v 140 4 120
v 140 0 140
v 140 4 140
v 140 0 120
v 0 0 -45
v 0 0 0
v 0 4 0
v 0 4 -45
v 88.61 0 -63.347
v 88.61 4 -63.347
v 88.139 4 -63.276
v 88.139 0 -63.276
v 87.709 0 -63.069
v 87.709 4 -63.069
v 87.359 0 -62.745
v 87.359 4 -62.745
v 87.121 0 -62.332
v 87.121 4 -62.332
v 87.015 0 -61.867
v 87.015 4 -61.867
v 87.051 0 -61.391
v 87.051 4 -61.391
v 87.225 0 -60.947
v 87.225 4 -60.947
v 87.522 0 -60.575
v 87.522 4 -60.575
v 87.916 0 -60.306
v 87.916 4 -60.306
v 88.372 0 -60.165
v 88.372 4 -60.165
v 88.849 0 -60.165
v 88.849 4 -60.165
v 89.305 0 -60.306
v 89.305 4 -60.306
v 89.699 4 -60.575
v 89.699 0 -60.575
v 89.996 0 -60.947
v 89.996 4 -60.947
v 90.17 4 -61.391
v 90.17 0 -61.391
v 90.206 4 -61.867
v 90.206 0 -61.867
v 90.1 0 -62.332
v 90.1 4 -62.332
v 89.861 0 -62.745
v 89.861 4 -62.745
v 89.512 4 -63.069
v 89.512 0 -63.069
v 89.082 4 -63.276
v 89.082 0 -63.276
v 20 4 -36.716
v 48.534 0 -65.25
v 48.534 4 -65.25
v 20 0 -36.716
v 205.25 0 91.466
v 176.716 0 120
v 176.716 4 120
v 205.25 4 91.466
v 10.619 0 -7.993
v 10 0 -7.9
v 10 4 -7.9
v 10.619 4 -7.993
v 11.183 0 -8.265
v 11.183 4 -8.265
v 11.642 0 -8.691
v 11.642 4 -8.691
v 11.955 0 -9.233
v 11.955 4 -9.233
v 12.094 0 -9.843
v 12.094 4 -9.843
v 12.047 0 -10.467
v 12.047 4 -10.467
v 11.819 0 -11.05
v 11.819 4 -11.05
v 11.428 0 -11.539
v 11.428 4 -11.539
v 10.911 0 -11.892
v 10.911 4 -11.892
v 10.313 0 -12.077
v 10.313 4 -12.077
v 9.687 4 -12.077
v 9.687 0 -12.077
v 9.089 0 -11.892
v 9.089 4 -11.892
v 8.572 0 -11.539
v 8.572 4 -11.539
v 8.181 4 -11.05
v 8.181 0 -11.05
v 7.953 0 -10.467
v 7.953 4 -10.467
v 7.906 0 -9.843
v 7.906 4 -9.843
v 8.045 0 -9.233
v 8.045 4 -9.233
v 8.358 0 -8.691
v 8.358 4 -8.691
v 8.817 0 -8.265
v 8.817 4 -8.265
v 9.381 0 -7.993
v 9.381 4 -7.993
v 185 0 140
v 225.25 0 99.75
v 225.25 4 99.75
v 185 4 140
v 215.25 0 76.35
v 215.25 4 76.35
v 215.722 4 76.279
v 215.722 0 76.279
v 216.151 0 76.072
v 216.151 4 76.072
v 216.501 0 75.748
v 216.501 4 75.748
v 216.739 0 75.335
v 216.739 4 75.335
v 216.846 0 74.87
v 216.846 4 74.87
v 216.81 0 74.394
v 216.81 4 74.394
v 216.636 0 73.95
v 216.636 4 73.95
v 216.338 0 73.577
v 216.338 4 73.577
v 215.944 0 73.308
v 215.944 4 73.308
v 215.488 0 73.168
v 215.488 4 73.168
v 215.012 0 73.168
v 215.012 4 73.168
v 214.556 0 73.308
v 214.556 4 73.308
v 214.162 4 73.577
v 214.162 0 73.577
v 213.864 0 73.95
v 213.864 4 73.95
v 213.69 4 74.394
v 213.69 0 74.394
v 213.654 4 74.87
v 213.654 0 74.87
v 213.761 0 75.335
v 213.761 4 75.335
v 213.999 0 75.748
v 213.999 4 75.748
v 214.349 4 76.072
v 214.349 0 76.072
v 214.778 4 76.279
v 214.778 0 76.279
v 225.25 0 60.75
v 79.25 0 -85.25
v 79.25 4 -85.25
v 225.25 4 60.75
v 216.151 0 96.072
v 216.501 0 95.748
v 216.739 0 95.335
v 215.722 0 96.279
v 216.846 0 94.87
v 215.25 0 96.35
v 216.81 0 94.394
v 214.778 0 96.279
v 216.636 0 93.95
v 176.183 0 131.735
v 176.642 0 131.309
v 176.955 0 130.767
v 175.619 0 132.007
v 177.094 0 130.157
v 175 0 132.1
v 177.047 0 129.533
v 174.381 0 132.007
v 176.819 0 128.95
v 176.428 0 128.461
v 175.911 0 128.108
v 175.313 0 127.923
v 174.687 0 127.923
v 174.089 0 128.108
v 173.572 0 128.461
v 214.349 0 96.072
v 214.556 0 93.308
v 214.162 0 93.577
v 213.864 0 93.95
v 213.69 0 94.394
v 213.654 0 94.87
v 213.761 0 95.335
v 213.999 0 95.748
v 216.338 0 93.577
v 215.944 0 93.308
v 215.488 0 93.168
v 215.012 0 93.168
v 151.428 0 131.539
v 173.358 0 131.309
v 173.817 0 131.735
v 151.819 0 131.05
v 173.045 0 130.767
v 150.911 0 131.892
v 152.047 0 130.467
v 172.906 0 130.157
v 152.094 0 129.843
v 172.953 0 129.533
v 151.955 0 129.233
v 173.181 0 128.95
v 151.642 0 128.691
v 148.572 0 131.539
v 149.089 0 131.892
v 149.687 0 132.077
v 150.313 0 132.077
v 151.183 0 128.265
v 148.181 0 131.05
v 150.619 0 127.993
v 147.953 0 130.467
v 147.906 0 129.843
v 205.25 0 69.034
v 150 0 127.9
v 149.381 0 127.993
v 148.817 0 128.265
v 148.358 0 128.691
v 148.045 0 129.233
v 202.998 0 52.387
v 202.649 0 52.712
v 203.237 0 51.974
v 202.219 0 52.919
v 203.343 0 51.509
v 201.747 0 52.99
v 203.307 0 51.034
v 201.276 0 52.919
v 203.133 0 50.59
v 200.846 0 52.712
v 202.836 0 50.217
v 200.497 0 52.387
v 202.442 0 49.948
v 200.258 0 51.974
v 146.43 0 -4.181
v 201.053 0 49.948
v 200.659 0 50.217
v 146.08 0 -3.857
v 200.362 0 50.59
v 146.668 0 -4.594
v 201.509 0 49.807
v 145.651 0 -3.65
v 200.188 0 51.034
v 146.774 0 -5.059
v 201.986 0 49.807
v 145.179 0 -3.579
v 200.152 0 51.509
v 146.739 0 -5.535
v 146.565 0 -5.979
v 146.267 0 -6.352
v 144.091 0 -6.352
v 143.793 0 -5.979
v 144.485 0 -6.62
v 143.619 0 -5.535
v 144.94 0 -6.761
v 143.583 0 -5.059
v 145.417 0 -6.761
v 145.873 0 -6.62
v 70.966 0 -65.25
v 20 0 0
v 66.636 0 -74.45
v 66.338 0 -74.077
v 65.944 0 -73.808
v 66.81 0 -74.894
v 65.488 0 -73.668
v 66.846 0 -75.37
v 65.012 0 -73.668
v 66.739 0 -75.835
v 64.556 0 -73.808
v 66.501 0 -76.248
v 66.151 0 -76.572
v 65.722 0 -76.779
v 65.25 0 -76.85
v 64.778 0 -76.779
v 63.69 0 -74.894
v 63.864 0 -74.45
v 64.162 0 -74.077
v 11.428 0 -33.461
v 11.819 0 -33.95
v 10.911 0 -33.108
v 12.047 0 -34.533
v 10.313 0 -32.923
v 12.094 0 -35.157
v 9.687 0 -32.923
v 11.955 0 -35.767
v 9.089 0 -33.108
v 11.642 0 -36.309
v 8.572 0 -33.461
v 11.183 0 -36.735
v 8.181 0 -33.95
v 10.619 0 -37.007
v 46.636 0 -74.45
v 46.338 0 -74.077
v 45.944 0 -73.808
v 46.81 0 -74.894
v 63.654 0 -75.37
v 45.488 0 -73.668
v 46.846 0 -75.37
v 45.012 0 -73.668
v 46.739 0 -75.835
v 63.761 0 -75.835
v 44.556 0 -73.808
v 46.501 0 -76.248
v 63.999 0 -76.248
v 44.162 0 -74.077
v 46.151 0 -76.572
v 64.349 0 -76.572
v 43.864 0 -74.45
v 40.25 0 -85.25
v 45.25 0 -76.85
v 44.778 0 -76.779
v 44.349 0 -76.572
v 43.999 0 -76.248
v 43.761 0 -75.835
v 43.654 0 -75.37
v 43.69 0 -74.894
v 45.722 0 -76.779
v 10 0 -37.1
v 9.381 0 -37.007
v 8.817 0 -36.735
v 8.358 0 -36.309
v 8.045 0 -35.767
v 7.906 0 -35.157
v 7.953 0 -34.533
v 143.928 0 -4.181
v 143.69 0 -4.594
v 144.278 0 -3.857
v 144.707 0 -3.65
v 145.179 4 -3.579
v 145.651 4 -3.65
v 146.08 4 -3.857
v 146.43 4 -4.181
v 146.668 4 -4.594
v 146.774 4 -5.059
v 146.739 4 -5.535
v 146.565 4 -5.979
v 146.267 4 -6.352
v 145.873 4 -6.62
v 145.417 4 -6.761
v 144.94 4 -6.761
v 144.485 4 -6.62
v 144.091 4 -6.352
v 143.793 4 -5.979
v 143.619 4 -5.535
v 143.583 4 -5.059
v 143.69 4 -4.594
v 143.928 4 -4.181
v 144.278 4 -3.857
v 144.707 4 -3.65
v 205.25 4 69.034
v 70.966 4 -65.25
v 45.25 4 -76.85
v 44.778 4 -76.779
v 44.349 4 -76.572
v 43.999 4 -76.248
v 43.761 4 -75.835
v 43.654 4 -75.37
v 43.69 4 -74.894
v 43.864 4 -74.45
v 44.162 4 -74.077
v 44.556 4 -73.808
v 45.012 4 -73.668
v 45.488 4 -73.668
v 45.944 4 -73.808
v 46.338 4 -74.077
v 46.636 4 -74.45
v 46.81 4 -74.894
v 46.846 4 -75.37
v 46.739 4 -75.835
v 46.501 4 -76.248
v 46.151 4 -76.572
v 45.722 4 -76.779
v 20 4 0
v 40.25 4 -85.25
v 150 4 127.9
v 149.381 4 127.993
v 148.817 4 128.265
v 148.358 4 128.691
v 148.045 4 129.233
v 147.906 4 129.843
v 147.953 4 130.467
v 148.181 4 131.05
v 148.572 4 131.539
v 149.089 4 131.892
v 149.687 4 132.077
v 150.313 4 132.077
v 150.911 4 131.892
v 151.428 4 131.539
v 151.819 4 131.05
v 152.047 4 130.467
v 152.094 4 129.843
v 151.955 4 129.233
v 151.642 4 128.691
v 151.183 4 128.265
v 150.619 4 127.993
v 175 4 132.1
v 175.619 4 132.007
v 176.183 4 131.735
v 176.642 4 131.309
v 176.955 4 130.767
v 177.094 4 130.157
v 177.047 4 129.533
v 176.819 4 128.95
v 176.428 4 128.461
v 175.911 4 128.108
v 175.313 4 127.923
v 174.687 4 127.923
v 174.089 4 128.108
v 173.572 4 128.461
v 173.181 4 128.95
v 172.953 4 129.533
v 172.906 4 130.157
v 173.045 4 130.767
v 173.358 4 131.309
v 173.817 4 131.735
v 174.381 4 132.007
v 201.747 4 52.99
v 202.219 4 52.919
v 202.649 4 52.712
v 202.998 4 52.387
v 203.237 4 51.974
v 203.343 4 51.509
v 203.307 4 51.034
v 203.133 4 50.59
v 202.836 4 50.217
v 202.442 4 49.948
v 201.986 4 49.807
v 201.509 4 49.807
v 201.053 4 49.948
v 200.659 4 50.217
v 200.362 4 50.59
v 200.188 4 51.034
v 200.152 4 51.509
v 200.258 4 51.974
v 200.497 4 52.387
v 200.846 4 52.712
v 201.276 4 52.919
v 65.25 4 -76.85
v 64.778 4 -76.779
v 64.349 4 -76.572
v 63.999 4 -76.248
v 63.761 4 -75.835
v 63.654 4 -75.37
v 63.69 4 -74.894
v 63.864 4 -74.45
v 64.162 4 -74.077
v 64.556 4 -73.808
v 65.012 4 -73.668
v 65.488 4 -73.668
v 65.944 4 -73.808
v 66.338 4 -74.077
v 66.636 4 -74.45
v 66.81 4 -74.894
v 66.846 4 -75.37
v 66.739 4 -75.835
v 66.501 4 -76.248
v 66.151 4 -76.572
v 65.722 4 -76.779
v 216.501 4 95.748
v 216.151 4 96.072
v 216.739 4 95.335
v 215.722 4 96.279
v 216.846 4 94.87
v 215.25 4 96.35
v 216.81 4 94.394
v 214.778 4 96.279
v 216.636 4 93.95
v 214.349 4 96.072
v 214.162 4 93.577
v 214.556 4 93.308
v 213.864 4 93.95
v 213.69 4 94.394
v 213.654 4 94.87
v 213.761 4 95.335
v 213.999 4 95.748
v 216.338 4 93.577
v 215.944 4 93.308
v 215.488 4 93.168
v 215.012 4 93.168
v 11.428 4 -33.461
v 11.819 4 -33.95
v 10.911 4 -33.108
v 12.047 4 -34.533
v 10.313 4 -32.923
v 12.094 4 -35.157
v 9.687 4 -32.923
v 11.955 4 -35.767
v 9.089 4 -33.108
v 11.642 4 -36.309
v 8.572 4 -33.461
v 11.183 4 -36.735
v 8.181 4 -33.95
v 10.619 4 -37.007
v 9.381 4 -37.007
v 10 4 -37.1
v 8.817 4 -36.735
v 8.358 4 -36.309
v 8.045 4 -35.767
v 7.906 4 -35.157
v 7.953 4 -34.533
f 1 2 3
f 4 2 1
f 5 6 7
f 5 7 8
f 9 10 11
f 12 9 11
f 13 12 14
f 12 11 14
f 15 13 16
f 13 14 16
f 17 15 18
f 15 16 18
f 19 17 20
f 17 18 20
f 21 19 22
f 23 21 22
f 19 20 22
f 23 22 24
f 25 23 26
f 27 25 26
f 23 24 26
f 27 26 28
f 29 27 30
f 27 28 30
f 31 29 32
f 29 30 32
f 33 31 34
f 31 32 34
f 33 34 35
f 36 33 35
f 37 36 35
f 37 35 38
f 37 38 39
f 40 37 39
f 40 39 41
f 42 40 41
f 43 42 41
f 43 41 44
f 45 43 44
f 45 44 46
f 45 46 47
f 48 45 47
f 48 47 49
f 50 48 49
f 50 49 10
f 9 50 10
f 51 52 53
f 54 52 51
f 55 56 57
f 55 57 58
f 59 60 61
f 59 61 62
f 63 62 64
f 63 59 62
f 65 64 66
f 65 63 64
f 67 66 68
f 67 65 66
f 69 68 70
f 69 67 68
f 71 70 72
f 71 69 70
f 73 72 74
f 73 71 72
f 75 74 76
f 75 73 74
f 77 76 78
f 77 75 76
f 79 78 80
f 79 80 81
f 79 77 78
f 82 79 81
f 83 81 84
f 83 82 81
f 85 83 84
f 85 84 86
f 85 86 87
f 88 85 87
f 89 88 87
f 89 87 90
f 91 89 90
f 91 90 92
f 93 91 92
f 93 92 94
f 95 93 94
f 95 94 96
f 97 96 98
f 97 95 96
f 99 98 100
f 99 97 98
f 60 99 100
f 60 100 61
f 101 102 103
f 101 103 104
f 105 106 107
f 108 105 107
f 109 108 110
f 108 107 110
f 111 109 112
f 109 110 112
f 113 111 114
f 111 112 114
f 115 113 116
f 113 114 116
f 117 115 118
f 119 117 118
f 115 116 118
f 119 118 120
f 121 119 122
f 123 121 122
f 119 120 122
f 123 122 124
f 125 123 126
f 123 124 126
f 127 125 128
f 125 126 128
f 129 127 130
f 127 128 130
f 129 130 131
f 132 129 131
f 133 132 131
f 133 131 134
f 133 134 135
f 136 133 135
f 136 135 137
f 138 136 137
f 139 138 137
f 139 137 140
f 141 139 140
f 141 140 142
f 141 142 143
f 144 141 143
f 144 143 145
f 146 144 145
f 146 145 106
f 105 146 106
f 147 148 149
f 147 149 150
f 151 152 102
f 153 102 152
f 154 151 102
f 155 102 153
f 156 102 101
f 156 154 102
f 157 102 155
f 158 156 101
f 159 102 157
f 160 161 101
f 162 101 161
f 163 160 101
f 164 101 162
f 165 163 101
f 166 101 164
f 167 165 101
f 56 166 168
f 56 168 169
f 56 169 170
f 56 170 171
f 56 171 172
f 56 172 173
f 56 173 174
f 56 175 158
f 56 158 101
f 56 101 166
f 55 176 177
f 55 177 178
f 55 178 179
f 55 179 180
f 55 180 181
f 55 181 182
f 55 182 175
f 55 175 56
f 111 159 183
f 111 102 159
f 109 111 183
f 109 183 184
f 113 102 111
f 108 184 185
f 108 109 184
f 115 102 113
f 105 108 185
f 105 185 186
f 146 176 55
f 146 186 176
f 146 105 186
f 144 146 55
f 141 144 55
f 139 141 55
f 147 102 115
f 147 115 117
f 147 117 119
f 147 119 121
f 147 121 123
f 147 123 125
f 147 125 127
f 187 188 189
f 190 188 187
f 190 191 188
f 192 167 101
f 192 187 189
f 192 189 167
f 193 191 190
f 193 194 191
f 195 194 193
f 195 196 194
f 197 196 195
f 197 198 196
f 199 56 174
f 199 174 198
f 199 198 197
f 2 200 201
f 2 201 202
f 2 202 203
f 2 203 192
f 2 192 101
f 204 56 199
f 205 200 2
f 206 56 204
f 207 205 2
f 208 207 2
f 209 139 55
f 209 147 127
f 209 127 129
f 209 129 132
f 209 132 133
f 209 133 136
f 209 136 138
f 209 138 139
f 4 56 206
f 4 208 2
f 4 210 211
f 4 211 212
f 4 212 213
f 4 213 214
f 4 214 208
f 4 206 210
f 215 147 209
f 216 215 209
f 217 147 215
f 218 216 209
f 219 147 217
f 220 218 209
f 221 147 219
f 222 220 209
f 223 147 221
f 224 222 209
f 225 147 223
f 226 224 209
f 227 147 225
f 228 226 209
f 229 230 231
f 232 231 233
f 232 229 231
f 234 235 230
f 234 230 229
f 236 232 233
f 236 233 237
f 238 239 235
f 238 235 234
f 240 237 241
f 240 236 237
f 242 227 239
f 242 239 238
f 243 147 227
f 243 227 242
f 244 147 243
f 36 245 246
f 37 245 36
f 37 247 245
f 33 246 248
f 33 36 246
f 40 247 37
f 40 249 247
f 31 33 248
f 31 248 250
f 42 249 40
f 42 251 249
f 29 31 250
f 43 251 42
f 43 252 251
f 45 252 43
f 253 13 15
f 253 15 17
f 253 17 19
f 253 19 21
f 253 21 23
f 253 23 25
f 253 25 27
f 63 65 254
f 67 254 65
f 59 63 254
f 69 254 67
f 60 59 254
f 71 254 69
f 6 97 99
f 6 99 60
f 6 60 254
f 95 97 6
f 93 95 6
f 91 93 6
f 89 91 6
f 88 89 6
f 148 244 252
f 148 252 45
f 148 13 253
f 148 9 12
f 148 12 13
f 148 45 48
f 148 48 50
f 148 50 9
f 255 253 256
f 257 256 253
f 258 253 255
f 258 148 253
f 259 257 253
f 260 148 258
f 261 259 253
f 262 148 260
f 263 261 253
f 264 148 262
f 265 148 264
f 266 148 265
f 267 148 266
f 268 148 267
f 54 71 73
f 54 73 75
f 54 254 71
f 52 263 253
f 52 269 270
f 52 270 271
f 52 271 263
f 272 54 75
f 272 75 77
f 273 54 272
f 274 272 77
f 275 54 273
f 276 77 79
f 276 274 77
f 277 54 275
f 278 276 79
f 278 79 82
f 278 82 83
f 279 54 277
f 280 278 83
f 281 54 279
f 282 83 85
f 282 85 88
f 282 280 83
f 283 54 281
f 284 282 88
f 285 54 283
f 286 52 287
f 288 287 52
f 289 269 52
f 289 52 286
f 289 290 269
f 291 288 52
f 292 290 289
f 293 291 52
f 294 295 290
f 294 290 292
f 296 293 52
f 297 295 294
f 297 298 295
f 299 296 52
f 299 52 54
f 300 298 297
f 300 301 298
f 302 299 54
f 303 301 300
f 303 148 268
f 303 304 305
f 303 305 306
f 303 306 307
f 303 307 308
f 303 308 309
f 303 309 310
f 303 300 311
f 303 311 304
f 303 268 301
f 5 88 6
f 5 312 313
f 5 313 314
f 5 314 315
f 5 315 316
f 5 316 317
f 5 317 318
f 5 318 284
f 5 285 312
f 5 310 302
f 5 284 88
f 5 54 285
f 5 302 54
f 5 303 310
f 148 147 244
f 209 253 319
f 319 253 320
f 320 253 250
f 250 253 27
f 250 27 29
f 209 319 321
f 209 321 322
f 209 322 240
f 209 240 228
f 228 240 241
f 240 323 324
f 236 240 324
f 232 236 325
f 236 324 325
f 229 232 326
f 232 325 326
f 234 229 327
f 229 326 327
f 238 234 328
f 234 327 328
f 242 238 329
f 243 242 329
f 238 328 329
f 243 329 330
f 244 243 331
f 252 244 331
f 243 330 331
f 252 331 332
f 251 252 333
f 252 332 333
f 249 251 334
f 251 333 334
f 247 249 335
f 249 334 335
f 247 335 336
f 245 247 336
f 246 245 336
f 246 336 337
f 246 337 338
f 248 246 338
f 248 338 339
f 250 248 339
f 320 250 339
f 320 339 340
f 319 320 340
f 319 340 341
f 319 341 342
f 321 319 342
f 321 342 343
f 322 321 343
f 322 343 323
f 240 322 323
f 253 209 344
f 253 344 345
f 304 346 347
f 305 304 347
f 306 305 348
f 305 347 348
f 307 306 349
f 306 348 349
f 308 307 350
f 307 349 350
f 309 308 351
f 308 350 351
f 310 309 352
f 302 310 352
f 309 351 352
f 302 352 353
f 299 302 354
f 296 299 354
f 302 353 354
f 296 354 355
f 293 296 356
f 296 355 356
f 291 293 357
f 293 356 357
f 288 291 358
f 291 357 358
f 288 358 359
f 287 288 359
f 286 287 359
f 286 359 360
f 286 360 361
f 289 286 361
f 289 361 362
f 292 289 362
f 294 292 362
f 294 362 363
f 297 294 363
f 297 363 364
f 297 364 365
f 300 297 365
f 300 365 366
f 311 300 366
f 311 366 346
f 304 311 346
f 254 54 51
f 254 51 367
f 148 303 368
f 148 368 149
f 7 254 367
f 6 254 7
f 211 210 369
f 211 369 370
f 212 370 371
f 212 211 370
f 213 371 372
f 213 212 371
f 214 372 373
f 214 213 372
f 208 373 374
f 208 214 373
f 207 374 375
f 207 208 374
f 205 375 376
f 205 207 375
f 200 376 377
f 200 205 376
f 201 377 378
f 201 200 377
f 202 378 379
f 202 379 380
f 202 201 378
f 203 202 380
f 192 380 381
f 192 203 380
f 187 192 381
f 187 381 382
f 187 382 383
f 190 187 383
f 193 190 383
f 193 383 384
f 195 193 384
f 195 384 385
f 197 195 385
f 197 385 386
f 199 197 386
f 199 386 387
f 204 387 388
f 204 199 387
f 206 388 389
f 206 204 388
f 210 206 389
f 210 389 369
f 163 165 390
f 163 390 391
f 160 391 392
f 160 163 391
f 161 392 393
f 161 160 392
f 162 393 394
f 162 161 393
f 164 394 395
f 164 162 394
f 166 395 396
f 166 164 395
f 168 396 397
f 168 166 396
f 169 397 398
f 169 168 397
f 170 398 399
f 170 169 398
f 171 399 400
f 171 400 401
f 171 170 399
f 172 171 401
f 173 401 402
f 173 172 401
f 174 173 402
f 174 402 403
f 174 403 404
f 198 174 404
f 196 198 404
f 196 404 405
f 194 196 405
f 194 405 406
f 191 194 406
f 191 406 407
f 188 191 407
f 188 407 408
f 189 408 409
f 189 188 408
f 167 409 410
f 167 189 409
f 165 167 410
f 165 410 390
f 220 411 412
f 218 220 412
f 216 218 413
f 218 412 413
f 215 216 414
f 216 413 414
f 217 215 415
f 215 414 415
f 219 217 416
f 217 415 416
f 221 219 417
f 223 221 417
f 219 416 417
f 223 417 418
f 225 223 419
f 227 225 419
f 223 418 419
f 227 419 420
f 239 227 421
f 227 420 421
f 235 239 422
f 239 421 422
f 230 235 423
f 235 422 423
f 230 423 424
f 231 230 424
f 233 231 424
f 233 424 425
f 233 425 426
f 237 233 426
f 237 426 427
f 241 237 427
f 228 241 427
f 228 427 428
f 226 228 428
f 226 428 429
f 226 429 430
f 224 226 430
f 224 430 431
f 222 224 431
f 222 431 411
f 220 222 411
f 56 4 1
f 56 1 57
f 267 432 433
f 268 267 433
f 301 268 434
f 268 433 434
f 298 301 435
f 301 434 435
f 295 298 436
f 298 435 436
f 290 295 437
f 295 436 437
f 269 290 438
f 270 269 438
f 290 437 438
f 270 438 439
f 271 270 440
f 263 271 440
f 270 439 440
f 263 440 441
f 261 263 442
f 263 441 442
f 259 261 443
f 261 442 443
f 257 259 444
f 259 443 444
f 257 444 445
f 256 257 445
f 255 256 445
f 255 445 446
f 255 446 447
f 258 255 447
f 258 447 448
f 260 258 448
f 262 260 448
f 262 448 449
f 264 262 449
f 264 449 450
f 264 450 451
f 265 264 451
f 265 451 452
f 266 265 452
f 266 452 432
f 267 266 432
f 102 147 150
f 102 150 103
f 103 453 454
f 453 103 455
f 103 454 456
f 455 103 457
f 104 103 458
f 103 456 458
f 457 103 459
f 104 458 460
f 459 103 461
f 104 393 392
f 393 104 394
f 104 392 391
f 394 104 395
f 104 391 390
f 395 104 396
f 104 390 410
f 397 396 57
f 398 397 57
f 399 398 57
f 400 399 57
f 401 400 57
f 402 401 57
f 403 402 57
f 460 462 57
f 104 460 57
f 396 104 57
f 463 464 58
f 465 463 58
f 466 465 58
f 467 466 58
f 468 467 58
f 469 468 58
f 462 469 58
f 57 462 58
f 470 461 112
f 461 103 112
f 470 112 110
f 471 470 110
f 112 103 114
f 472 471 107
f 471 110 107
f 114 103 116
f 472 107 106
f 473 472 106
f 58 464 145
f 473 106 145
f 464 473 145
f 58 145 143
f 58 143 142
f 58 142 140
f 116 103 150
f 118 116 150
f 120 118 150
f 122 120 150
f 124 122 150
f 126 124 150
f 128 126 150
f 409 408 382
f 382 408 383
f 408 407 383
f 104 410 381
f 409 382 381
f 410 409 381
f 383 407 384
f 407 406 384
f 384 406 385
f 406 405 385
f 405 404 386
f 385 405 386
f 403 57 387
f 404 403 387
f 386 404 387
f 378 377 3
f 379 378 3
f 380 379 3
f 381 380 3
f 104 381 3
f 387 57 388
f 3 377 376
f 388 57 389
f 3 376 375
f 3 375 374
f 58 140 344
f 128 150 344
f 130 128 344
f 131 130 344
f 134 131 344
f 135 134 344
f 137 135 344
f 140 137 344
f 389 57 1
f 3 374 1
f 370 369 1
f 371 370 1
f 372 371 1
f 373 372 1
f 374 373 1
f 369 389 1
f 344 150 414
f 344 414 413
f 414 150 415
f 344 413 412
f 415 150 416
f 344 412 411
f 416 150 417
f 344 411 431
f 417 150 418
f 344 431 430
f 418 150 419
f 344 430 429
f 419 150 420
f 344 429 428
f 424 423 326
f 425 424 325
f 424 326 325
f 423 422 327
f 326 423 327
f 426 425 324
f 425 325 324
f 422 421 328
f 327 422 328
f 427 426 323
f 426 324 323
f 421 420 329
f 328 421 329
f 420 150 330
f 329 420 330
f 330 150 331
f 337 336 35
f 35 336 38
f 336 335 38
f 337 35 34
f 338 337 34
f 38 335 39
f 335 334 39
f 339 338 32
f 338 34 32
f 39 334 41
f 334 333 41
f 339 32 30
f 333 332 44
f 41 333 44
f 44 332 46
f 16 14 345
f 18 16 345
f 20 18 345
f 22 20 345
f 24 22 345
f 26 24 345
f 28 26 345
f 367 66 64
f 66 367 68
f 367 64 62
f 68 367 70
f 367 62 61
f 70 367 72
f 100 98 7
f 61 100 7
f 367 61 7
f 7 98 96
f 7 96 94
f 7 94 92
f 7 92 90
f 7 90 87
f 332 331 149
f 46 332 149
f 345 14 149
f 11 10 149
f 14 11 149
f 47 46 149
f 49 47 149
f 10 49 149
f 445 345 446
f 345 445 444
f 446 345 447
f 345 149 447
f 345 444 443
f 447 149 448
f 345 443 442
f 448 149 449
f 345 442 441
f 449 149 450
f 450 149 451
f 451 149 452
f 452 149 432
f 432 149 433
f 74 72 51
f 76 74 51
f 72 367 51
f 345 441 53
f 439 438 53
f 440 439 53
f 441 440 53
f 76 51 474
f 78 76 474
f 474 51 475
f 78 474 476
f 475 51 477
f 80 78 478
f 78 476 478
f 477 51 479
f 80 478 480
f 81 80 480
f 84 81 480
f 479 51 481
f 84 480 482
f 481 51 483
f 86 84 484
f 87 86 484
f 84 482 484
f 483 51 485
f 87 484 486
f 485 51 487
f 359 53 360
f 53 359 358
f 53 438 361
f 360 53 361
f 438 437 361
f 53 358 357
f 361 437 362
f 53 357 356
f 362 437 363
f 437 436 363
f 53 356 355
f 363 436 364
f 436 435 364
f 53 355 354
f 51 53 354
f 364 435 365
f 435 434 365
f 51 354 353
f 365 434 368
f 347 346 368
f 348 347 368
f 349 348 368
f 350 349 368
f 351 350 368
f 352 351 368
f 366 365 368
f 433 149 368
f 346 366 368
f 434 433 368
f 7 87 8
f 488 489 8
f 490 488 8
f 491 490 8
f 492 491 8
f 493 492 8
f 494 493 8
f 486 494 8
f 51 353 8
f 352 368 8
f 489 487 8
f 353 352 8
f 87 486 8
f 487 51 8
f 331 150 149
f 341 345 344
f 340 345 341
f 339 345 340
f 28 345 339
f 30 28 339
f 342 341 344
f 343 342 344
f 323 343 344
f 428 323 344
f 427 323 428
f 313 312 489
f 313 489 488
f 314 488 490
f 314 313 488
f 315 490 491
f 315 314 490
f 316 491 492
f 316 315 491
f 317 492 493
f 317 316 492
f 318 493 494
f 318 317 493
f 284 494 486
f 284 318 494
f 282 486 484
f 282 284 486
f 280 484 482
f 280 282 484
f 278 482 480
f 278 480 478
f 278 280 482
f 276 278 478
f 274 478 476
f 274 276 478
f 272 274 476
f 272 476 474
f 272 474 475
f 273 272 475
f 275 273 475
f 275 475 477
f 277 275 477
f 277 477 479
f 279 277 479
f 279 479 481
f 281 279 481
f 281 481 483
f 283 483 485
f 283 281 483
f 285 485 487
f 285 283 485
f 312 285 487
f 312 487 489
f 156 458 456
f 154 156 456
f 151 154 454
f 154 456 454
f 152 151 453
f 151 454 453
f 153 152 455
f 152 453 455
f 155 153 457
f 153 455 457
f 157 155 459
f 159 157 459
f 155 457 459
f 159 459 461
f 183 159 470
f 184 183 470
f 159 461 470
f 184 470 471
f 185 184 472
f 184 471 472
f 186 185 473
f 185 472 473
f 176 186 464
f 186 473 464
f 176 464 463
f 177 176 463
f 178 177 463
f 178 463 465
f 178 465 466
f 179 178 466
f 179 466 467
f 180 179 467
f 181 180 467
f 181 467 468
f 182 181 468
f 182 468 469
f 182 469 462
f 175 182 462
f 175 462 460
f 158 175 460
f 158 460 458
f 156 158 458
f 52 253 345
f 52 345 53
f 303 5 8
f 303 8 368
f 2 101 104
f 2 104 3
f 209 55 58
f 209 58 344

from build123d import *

# Parameters (mm, degrees)
SKETCH_1_R          = 2.1
EXTRUDE_1_DEPTH     = 4
SKETCH_2_R          = 1.6
CUT_EXTRUDE_1_DEPTH = 50


with BuildPart() as part:
    # 草图1 → 凸台-拉伸1 (new body)
    with BuildSketch(Plane(origin=(0, 0, 0), x_dir=(1, 0, 0), z_dir=(0, 1, 0))):
        Polygon((20, 0), (0, 0), (0, 45), (40.25, 85.25), (79.25, 85.25), (225.25, -60.75), (225.25, -99.75), (185, -140), (140, -140), (140, -120), (176.715728753, -120), (205.25, -91.465728753), (205.25, -69.034271247), (70.965728753, 65.25), (48.534271247, 65.25), (20, 36.715728753), align=None)
        with Locations(Location((10, 10, 0), (0, 0, 270))):
            Circle(SKETCH_1_R, mode=Mode.SUBTRACT)
        with Locations(Location((10, 35, 0), (0, 0, 90))):
            Circle(SKETCH_1_R, mode=Mode.SUBTRACT)
        with Locations(Location((175, -130, 0), (0, 0, 270))):
            Circle(SKETCH_1_R, mode=Mode.SUBTRACT)
        with Locations(Location((150, -130, 0), (0, 0, 90))):
            Circle(SKETCH_1_R, mode=Mode.SUBTRACT)
    extrude(amount=EXTRUDE_1_DEPTH)

    # 草图2 → 切除-拉伸1 (cut)
    with BuildSketch(Plane(origin=(0, 4, 0), x_dir=(1, 0, 0), z_dir=(0, 1, 0))):
        with Locations(Location((215.25, -94.75, 0), (0, 0, 270))):
            Circle(SKETCH_2_R)
        with Locations(Location((215.25, -74.75, 0), (0, 0, 270))):
            Circle(SKETCH_2_R)
        with Locations(Location((201.747474683, -51.389610307, 0), (0, 0, 270))):
            Circle(SKETCH_2_R)
        with Locations(Location((145.178932188, 5.178932188, 0), (0, 0, 270))):
            Circle(SKETCH_2_R)
        with Locations(Location((88.610389693, 61.747474683, 0), (0, 0, 90))):
            Circle(SKETCH_2_R)
        with Locations(Location((65.25, 75.25, 0), (0, 0, 90))):
            Circle(SKETCH_2_R)
        with Locations(Location((45.25, 75.25, 0), (0, 0, 90))):
            Circle(SKETCH_2_R)
    extrude(amount=-CUT_EXTRUDE_1_DEPTH, mode=Mode.SUBTRACT)


solid = part.part
